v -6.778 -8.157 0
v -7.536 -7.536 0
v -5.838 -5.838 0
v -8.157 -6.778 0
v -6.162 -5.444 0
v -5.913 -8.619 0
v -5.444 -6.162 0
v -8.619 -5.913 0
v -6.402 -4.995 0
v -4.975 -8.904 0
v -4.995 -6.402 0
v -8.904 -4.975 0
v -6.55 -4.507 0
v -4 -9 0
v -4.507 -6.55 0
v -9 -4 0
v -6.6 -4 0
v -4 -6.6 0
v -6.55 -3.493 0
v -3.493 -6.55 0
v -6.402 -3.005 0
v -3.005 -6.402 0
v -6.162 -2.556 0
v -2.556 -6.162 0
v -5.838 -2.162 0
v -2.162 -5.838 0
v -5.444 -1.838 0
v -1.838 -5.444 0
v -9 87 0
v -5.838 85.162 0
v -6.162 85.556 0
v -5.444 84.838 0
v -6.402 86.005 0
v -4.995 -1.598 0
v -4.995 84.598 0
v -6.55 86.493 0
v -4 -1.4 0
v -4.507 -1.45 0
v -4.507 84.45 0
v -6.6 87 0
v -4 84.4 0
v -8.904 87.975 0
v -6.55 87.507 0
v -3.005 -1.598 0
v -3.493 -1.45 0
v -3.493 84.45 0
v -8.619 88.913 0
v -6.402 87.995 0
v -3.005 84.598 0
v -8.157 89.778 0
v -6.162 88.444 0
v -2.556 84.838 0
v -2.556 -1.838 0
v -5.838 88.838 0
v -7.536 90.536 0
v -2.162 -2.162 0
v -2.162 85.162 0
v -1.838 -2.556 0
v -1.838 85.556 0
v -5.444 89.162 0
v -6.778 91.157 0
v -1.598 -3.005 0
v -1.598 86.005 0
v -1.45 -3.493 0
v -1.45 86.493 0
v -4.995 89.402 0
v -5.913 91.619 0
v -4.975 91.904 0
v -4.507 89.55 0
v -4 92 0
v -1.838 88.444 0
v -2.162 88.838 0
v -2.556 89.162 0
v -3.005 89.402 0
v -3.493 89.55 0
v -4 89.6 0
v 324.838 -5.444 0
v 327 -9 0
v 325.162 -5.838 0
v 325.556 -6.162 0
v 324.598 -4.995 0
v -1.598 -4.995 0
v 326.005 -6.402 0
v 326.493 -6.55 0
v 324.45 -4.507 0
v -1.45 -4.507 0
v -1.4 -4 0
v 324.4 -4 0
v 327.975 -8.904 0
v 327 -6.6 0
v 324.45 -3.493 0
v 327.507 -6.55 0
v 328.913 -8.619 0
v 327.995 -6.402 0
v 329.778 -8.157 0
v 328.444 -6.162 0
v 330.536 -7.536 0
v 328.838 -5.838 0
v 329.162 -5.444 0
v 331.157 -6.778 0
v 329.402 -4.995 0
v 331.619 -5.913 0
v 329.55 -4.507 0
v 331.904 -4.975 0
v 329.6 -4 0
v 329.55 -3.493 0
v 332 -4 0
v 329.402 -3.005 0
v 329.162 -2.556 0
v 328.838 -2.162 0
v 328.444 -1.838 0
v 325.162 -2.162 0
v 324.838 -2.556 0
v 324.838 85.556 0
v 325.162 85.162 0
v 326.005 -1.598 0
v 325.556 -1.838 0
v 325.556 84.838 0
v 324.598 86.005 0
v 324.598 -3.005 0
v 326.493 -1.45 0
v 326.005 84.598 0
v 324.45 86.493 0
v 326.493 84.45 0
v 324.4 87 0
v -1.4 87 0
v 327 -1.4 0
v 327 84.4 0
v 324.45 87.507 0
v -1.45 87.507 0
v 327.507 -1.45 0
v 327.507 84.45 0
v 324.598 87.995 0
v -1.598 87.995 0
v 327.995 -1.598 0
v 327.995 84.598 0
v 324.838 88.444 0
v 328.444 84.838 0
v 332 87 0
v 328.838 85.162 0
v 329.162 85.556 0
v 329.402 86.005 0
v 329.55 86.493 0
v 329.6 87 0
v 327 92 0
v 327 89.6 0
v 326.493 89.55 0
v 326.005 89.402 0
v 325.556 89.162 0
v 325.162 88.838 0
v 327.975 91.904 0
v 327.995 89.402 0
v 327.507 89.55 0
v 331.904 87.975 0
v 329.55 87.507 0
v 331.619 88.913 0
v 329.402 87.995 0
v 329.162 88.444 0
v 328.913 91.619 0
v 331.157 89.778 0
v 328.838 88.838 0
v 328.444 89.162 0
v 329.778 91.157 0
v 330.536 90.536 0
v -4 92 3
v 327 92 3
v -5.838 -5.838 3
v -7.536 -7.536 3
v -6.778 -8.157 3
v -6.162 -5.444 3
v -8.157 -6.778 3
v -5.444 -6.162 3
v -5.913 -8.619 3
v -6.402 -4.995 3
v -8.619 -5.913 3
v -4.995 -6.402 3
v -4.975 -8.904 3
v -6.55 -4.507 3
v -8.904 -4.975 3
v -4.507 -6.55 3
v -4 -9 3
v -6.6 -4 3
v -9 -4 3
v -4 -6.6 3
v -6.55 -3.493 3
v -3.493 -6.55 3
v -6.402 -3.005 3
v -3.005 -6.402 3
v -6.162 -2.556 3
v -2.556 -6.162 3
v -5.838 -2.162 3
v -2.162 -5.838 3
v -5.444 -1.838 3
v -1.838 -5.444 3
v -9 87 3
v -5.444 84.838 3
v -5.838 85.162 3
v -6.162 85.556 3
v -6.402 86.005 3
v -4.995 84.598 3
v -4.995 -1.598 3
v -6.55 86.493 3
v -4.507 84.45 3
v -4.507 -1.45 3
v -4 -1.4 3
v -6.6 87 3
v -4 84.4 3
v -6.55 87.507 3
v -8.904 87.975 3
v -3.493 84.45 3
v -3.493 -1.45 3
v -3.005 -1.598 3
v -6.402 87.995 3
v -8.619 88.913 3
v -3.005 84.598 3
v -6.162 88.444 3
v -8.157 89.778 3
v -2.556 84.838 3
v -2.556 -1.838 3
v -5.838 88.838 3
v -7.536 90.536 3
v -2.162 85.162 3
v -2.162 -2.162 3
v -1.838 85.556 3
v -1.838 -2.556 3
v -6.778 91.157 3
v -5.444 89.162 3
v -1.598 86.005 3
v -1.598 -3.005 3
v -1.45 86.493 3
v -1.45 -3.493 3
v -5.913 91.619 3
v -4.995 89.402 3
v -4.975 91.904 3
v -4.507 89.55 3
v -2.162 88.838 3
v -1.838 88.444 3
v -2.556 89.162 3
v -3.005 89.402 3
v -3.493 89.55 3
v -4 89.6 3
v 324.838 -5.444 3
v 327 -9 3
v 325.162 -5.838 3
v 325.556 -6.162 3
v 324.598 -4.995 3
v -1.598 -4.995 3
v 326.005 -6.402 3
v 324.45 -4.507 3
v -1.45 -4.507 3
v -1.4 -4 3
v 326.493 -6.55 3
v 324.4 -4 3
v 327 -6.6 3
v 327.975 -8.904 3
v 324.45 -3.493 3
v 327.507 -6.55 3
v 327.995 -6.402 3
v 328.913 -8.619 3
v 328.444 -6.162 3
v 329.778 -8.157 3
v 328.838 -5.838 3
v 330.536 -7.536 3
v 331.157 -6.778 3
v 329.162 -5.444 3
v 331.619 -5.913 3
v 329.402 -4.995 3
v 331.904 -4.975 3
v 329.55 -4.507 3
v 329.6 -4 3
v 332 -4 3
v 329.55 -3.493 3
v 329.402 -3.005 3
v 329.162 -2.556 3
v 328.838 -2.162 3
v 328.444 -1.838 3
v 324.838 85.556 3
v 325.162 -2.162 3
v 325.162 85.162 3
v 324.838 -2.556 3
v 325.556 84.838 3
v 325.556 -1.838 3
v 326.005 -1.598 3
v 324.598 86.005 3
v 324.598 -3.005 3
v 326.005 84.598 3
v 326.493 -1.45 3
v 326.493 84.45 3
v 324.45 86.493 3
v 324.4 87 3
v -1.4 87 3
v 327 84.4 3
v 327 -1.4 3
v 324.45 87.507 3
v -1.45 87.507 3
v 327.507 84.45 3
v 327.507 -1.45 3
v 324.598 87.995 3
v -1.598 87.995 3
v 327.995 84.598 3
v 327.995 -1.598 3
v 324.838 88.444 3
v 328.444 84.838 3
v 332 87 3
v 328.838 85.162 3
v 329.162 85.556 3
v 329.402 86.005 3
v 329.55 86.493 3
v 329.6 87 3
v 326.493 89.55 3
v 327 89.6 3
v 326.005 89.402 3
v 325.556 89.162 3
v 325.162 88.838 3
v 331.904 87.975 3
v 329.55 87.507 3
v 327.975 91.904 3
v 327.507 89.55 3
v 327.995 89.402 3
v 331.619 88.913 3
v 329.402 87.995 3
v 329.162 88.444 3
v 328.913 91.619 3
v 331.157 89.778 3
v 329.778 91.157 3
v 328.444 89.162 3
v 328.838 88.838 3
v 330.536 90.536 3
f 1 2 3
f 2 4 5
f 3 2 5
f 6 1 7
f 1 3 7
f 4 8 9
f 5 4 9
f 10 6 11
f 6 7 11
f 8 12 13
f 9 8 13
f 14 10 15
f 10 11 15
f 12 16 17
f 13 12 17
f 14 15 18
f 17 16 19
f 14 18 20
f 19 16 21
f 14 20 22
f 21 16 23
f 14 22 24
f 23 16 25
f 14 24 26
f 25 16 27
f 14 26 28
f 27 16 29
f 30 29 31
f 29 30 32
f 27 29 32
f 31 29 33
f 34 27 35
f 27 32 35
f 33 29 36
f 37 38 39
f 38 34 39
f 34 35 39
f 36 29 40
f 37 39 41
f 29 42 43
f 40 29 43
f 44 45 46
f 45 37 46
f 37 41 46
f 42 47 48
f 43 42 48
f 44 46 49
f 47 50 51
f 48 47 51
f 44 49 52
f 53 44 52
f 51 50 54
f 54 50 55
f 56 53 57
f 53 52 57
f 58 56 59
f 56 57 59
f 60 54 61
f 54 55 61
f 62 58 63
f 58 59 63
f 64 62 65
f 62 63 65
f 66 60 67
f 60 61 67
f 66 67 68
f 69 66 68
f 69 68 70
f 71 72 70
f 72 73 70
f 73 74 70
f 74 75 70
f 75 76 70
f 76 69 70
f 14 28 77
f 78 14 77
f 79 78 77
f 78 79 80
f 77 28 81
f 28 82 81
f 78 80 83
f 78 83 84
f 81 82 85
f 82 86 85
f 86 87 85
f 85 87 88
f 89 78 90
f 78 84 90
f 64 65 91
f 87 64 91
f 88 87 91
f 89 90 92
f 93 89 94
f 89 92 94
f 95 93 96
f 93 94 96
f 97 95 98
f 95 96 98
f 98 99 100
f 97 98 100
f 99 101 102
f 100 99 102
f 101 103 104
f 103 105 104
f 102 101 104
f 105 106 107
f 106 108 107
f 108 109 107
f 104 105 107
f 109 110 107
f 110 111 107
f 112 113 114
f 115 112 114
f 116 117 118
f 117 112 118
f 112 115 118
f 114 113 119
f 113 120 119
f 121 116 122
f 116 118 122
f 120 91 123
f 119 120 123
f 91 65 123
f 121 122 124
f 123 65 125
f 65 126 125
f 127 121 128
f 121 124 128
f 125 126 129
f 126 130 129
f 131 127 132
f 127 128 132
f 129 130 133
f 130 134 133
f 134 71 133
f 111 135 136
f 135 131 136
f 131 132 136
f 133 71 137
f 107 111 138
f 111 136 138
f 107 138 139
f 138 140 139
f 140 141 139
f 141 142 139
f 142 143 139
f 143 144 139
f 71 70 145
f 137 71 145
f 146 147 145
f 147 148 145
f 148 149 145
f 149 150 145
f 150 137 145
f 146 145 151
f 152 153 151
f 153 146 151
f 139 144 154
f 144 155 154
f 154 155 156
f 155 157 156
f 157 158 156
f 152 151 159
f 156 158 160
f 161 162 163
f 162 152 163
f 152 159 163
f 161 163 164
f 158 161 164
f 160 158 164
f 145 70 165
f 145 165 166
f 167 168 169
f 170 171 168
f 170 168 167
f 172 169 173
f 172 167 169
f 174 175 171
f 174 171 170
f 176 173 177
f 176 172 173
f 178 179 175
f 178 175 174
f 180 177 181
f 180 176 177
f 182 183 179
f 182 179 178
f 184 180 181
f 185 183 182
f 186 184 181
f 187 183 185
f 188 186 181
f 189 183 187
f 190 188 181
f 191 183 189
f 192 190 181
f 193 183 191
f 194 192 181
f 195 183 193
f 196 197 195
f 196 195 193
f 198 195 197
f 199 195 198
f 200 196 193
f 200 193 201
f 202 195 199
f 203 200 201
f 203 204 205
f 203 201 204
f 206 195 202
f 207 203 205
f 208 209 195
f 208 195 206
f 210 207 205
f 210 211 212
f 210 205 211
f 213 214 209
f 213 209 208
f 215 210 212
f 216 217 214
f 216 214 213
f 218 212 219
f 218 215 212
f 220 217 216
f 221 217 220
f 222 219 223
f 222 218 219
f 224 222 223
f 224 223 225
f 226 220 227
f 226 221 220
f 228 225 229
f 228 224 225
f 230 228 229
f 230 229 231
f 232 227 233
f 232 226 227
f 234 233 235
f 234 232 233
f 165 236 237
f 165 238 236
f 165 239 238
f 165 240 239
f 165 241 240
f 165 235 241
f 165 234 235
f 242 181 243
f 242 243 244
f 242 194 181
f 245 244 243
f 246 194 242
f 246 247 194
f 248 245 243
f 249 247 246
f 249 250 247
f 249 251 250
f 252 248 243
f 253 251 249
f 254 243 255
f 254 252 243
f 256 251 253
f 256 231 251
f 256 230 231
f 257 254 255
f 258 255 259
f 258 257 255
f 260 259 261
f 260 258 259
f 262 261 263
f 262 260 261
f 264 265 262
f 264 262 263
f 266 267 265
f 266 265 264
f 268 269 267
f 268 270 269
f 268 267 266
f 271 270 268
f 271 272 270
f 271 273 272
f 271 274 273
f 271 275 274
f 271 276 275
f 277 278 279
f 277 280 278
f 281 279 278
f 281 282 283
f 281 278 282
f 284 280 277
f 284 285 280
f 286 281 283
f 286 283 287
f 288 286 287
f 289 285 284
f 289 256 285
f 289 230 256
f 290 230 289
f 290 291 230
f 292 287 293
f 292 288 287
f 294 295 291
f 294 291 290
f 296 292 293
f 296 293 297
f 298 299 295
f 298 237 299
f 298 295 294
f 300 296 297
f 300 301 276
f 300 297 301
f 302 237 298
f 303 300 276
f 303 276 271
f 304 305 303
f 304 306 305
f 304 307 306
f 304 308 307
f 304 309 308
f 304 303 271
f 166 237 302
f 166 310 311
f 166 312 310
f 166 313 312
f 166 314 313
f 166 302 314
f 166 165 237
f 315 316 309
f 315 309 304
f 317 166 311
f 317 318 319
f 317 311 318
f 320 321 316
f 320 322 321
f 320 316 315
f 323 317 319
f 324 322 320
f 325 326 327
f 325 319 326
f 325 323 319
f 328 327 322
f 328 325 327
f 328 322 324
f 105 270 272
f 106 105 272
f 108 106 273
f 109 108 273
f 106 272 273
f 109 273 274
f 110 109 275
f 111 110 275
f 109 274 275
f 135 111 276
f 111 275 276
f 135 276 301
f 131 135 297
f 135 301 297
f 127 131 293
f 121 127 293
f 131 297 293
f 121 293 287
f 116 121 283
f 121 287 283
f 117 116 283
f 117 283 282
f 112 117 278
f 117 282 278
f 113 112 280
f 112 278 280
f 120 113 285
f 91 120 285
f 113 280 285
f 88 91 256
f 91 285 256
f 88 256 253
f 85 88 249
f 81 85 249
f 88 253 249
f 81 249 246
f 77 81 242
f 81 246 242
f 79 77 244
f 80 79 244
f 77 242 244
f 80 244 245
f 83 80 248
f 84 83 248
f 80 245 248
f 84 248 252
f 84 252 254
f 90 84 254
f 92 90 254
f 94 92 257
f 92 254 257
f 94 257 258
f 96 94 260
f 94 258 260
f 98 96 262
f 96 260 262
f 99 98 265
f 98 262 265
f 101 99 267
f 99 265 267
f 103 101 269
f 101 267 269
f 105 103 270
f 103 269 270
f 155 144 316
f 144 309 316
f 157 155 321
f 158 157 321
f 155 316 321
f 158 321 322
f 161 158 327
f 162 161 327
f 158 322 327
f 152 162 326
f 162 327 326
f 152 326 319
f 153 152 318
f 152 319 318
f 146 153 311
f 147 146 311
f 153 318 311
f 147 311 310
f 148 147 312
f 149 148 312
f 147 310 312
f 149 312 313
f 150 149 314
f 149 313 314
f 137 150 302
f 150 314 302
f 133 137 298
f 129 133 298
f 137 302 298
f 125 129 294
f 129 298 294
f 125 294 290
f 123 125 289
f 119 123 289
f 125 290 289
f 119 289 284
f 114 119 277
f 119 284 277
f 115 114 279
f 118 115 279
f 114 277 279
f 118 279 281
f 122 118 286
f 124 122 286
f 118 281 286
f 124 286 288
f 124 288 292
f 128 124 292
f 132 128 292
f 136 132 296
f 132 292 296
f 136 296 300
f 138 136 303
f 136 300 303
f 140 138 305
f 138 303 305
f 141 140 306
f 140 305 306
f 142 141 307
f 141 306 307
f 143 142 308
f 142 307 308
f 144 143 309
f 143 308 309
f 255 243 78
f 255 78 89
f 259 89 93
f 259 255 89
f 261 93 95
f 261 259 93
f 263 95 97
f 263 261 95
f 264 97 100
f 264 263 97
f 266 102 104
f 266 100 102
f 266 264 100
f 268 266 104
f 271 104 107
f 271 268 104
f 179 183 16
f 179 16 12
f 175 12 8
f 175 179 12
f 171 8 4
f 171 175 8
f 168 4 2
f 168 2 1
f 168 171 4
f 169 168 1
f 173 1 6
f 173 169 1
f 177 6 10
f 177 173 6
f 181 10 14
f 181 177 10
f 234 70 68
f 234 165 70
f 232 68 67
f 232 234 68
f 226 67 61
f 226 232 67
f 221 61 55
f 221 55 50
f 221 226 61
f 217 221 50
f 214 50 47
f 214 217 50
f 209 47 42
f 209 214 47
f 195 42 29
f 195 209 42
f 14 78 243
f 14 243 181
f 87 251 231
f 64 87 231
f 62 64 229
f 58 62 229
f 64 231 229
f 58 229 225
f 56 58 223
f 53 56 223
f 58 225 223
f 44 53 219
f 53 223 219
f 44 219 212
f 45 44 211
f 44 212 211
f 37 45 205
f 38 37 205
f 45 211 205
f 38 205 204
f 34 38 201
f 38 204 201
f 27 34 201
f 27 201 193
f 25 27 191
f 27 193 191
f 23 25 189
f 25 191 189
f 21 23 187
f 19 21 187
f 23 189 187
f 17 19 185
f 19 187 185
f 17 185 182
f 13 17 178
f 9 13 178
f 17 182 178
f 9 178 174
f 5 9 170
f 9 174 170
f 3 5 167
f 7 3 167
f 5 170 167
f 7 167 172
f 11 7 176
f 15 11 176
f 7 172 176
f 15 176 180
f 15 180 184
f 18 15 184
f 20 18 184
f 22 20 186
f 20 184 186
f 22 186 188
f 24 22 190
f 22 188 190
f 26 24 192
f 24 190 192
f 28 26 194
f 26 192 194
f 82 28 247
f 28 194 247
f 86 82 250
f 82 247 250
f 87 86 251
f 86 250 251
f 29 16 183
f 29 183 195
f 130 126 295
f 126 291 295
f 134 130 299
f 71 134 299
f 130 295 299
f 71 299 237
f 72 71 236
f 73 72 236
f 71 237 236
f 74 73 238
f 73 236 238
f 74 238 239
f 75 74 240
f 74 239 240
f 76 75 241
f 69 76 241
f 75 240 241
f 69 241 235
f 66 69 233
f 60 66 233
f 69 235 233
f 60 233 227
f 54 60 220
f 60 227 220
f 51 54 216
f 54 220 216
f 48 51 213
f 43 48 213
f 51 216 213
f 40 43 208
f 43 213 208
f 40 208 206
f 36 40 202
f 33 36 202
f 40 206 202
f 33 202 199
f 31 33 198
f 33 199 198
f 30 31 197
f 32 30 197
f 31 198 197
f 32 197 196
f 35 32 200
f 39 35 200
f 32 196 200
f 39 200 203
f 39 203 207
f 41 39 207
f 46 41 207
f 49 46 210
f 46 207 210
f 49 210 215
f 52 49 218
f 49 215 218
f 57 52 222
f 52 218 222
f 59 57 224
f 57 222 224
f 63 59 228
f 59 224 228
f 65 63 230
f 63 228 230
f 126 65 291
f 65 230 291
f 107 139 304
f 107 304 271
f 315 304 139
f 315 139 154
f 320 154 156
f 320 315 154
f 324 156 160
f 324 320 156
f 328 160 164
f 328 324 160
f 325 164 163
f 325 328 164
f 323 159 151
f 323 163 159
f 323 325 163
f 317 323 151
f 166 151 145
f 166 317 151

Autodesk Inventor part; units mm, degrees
ref_plane "YZ Plane" through (0, 0, 0) normal (1, 0, 0) x (0, 1, 0)
ref_plane "XZ Plane" through (0, 0, 0) normal (0, 1, 0) x (-1, 0, 0)
ref_plane "XY Plane" through (0, 0, 0) normal (0, 0, 1) x (1, 0, 0)
sketch "Sketch1" plane through (0, 0, 0) normal (0, 0, 1) x (1, 0, 0)
  line L0 (0, 0) -> (323, 0)
  line L1 (323, 0) -> (323, 83)
  line L2 (323, 83) -> (0, 83)
  line L3 (0, 83) -> (0, 0)
  line L4 (-9, 92) -> (332, 92)
  line L5 (332, 92) -> (332, -9)
  line L6 (332, -9) -> (-9, -9)
  line L7 (-9, -9) -> (-9, 92)
  dimension "d0" = 323
  dimension "d1" = 83
  dimension "d2" = 9
extrude "Extrusion1" add sketch "Sketch1" along normal blind 3 contours L3 L2 L1 L0 | L4 L5 L6 L7
sketch "Sketch2" plane through (0, 0, 3) normal (0, 0, 1) x (1, 0, 0)
  circle A0 centre (-4, 87) radius 2.6
  line L0 (332, 92) -> (-9, 92) projected
  line L1 (-9, 92) -> (-9, -9) projected
  line L2 (0, 0) -> (323, 0)
  line L3 (323, 0) -> (323, 83)
  line L4 (323, 83) -> (0, 83)
  line L5 (0, 83) -> (0, 0)
  line L6 (-9, -9) -> (332, -9) projected
  line L7 (332, -9) -> (332, 92) projected
  circle A1 centre (-4, 87) radius 3.5
  circle A2 centre (-4, -4) radius 2.6
  circle A3 centre (327, -4) radius 2.6
  circle A4 centre (327, 87) radius 2.6
  point P0 (0, 0)
  dimension "d6" = 5.2
  dimension "d9" = 9
  dimension "d10" = 9
  dimension "d11" = 9
  dimension "d12" = 9
  dimension "d15" = 7
  dimension "d16" = 5
  dimension "d17" = 5
  dimension "d18" = 5.2
  dimension "d19" = 5
  dimension "d20" = 5
  dimension "d21" = 5.2
  dimension "d22" = 5
  dimension "d23" = 5
  dimension "d24" = 5.2
  dimension "d25" = 5
  dimension "d26" = 5
extrude "Extrusion2" cut sketch "Sketch2" against normal blind 3 contours A0 | A2 | A3 | A4
fillet "Fillet2" radius 5 4 edges at (332, 92, 1.5) (332, -9, 1.5) (-9, 92, 1.5) (-9, -9, 1.5)
properties part number "Acrylic Front Plate"
